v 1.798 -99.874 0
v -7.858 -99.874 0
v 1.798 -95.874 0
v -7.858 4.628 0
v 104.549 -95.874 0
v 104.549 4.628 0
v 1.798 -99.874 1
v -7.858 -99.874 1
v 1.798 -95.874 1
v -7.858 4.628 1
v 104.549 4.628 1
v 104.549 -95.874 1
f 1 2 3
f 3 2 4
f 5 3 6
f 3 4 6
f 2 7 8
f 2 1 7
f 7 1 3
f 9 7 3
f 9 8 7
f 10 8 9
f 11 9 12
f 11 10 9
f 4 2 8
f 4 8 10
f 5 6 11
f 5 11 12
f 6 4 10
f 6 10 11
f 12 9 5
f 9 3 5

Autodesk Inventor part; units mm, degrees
ref_plane "YZ Plane" through (0, 0, 0) normal (1, 0, 0) x (0, 1, 0)
ref_plane "XZ Plane" through (0, 0, 0) normal (0, 1, 0) x (-1, 0, 0)
ref_plane "XY Plane" through (0, 0, 0) normal (0, 0, 1) x (1, 0, 0)
ref_plane "Plano de trabalho1" through (0, 0, 0) normal (0, 0, 1) x (1, 0, 0)
sketch "Esboço1" plane through (0, 0, 0) normal (0, 0, 1) x (1, 0, 0)
  line L0 (1.7982, -99.874) -> (1.7982, -95.874) projected
  line L1 (1.7982, -99.874) -> (197.7982, -99.874) projected
  line L2 (197.7982, -95.874) -> (197.7982, -99.874) projected
  line L3 (1.7982, -95.874) -> (197.7982, -95.874) projected
  line L4 (-7.8575, 4.6283) -> (104.5488, 4.6283)
  line L5 (104.5488, 4.6283) -> (104.5488, -99.874)
  line L6 (104.5488, -99.874) -> (-7.8575, -99.874)
  line L7 (-7.8575, -99.874) -> (-7.8575, 4.6283)
  point P0 (0, 0)
  point P1 (104.5488, -95.874)
extrude "Extrusão1" add sketch "Esboço1" along normal blind 1 contours L6 L7 L4 L5 L3 L0
